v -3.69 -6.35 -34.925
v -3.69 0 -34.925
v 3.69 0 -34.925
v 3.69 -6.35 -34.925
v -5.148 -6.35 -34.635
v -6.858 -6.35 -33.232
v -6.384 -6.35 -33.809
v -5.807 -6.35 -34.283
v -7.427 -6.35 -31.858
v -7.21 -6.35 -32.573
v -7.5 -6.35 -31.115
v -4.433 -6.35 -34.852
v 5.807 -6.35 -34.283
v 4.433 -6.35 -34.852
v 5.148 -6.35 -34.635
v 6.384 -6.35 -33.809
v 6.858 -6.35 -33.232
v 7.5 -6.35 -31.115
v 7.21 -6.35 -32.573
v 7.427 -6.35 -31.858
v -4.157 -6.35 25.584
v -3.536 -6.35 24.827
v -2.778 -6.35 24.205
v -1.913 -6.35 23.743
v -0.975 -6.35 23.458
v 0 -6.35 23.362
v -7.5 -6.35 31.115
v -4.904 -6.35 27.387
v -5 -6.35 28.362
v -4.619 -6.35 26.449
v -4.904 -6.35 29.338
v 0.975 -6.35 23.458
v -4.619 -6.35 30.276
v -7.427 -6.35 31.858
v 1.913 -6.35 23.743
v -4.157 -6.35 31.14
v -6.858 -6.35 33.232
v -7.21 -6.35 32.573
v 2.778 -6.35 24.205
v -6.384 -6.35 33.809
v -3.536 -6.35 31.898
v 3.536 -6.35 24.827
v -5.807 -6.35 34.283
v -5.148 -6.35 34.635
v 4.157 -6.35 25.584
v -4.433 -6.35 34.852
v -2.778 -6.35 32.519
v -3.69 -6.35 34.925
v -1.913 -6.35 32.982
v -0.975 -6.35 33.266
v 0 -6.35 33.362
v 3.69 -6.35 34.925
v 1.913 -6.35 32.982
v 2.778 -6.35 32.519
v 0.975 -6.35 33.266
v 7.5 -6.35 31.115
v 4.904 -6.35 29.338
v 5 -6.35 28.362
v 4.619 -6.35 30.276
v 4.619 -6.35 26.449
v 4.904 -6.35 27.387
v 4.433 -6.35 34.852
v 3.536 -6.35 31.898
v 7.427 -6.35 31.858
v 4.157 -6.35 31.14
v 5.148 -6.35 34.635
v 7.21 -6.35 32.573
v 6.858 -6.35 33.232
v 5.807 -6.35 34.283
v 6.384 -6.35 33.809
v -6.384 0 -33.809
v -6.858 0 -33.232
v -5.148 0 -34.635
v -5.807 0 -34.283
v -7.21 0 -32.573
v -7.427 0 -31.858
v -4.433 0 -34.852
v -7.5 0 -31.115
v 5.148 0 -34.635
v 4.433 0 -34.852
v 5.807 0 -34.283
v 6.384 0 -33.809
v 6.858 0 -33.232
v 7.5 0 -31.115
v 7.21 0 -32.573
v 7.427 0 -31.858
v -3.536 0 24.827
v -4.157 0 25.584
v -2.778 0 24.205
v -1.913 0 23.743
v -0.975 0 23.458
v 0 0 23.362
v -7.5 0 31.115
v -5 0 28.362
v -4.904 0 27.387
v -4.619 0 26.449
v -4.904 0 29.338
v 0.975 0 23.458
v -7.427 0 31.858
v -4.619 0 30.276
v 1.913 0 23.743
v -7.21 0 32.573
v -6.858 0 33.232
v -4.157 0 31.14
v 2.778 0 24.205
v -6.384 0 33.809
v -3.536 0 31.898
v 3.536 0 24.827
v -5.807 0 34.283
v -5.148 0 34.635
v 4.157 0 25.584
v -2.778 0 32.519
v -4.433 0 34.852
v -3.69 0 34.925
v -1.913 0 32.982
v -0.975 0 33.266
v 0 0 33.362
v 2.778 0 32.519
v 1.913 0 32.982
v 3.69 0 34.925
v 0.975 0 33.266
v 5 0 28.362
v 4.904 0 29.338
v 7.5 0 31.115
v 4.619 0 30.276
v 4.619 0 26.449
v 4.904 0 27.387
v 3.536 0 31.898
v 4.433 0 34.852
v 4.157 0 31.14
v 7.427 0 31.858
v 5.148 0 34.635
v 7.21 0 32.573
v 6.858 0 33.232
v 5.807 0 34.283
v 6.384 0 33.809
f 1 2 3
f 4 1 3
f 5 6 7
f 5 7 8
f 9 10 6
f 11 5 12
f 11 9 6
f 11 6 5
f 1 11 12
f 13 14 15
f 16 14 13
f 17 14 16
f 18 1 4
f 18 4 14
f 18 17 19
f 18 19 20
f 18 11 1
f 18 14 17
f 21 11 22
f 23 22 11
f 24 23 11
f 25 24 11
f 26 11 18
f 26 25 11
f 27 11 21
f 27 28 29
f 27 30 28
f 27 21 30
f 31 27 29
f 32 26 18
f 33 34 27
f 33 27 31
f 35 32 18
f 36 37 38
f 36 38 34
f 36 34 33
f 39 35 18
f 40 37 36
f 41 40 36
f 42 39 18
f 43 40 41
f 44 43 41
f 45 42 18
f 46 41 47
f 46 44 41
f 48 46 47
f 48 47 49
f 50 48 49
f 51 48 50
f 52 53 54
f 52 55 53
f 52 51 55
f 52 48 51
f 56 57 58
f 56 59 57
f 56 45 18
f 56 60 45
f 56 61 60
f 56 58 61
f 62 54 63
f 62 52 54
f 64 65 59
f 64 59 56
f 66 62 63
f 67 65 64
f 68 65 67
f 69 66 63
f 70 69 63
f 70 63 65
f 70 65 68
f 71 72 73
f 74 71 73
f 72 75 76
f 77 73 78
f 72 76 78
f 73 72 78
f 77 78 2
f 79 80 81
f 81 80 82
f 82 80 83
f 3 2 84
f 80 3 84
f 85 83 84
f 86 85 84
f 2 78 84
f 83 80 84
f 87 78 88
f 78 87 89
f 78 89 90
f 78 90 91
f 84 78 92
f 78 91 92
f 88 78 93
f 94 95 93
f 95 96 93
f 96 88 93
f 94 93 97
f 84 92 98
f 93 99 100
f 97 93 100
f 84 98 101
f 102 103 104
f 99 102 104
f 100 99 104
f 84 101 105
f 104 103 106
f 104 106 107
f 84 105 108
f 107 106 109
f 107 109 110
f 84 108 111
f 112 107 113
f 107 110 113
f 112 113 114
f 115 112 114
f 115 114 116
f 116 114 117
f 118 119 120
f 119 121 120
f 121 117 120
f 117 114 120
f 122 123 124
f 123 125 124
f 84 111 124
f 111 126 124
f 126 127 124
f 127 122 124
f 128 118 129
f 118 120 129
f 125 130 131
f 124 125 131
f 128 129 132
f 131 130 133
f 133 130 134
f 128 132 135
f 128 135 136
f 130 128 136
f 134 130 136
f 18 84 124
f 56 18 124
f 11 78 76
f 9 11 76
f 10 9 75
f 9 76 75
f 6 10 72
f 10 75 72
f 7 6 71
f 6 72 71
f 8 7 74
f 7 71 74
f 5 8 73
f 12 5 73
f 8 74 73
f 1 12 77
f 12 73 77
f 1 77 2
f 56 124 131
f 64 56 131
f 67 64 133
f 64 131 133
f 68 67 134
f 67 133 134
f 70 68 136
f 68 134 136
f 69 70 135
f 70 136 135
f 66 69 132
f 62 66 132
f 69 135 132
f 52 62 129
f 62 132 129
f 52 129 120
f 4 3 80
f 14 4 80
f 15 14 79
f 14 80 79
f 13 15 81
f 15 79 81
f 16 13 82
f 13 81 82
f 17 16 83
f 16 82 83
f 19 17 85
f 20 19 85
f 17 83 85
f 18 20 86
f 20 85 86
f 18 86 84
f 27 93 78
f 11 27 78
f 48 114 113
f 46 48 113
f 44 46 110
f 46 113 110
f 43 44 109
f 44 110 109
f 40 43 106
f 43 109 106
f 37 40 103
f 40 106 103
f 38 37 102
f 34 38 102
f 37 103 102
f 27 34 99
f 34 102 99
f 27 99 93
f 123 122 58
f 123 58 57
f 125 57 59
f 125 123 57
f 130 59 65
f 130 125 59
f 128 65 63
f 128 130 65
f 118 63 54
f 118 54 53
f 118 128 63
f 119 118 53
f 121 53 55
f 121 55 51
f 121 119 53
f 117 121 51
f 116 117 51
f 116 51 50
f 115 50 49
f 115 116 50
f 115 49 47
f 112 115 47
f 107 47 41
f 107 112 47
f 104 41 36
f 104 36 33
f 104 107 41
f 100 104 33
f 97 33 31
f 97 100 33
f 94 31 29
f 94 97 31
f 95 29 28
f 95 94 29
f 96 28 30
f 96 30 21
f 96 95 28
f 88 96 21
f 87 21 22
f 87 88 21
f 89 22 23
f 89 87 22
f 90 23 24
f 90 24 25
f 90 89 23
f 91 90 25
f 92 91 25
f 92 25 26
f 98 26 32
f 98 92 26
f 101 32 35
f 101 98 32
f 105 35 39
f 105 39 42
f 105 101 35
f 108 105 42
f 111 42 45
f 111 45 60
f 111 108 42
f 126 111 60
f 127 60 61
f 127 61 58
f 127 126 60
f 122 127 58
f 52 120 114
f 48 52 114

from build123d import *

# Parameters (mm, degrees)
F0_R     = 5
F1_DEPTH = 6.35


with BuildPart() as f1:
    # F0 (on Front) → F1 (new body)
    with BuildSketch(Plane.XZ):
        with BuildLine():
            Line((3.69, 34.925), (-3.69, 34.925))
            ThreePointArc((-3.69, 34.925), (-6.384077, 33.809077), (-7.5, 31.115))
            Line((-7.5, 31.115), (-7.5, -31.115))
            ThreePointArc((-7.5, -31.115), (-6.384077, -33.809077), (-3.69, -34.925))
            Line((-3.69, -34.925), (3.69, -34.925))
            ThreePointArc((3.69, -34.925), (6.384077, -33.809077), (7.5, -31.115))
            Line((7.5, -31.115), (7.5, 31.115))
            ThreePointArc((7.5, 31.115), (6.384077, 33.809077), (3.69, 34.925))
        make_face()
        with Locations((0, 28.362114)):
            Circle(F0_R, mode=Mode.SUBTRACT)
    extrude(amount=F1_DEPTH)


solid = f1.part
